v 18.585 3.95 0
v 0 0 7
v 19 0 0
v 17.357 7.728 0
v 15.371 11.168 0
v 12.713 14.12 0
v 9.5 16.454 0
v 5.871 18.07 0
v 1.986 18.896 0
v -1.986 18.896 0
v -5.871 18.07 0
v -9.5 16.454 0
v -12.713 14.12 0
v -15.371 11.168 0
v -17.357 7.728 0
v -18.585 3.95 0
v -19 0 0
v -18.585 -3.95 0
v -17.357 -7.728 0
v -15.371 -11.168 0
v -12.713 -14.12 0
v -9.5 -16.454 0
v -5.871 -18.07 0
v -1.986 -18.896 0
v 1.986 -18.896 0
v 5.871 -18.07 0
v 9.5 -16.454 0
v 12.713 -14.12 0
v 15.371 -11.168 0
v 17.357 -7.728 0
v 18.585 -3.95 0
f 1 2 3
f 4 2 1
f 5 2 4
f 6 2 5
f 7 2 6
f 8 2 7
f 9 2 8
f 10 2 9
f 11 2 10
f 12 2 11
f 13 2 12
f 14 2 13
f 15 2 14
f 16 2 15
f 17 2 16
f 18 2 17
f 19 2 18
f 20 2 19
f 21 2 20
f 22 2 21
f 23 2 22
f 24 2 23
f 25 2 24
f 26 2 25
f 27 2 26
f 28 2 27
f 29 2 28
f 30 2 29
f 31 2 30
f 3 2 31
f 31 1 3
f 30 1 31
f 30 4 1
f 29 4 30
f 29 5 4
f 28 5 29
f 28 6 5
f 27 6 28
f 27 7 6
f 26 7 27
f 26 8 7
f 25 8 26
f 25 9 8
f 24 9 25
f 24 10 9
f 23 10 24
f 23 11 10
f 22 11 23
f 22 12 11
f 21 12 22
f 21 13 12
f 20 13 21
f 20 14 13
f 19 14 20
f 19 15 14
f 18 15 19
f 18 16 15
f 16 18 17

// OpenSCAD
// Generated by SolidPython 1.0.1 on 2020-07-29 00:46:43


cylinder(h = 7, r1 = 19, r2 = 0);
/***********************************************
*********      SolidPython code:      **********
************************************************
 
# import packages: SolidPython
from solid import *
from solid.utils import *
from itertools import chain, combinations, permutations


class Resize:

    def __init__(self, scad_file):
        self.scad_file = scad_file
        #self.scad_file = import_scad(scad_file)
        # cone/cylinder param:
        self.r1 = 0
        self.r2 = 0
        self.h = 0
        # rectangular prism param:
        self.w = 0
        self.l = 0
        # ellipse param:
        self.r = 0

    # import OpenScad code (file name corresponds to shape)


    # classify shape + parameters
    def assign(self, param1, param2, param3):
        if self.scad_file == 'cone.scad':
            self.r1 = param1
            self.r2 = param2
            self.h = param3
        elif self.scad_file == 'cylinder.scad':
            self.r1 = param1
            self.r2 = param2
            self.h = param3
        elif self.scad_file == 'rectangularPrism.scad':
            self.h = param1
            self.l = param2
            self.w = param3
        else:
            self.r = param1
            self.h = param2

    # resize parameters
    def iterate(self):
        x = range(3, 20, 2)
        i = 1
        if self.scad_file == 'cone.scad':
            tempList = list(permutations(x, 2))
            for temp in tempList:
                param1 = temp[0]
                param2 = temp[1]
                filepath = 'produced_scad_files/' + 'cone' + str(param1) + '_' + str(param2) + '_' + '.scad'
                scad_render_to_file(cylinder(h=param1, r1=param2, r2=0), filepath)

        elif self.scad_file == 'cylinder.scad':
            tempList = list(permutations(x, 3))
            for temp in tempList:
                param1 = temp[0]
                param2 = temp[1]
                filepath = 'produced_scad_files/' + 'cylinder' + str(param1) + '_' + str(param2) + '_' + '.scad'
                scad_render_to_file(cylinder(h=param1, r1=param2, r2=param2), filepath)

        elif self.scad_file == 'rectangularPrism.scad':
            tempList = list(permutations(x, 3))
            for temp in tempList:
                param1 = temp[0]
                param2 = temp[1]
                param3 = temp[2]
                filepath = 'produced_scad_files/' + 'rectangularPrism' + str(param1) + '_' + str(param2) + '_' + str(
                    param3) + '.scad'
                scad_render_to_file(cube(size=(param1, param2, param3)), filepath)

        elif self.scad_file == 'ellipse.scad':
            tempList = list(permutations(x, 4))
            for temp in tempList:
                param1 = temp[0]
                param2 = temp[1]
                param3 = temp[2]
                param4 = temp[3]
                filepath = 'produced_scad_files/' + 'ellipse' + str(param1) + '_' + str(param2) + '_' + str(param3) + '_' + str(param4) + '.scad'
                scad_render_to_file(scale([param1, param2, param3])(sphere(r=param4)), filepath)

    def render_to_scadfile(self):
        scad_render_to_file(scad, 'example.scad') 
 
************************************************/
